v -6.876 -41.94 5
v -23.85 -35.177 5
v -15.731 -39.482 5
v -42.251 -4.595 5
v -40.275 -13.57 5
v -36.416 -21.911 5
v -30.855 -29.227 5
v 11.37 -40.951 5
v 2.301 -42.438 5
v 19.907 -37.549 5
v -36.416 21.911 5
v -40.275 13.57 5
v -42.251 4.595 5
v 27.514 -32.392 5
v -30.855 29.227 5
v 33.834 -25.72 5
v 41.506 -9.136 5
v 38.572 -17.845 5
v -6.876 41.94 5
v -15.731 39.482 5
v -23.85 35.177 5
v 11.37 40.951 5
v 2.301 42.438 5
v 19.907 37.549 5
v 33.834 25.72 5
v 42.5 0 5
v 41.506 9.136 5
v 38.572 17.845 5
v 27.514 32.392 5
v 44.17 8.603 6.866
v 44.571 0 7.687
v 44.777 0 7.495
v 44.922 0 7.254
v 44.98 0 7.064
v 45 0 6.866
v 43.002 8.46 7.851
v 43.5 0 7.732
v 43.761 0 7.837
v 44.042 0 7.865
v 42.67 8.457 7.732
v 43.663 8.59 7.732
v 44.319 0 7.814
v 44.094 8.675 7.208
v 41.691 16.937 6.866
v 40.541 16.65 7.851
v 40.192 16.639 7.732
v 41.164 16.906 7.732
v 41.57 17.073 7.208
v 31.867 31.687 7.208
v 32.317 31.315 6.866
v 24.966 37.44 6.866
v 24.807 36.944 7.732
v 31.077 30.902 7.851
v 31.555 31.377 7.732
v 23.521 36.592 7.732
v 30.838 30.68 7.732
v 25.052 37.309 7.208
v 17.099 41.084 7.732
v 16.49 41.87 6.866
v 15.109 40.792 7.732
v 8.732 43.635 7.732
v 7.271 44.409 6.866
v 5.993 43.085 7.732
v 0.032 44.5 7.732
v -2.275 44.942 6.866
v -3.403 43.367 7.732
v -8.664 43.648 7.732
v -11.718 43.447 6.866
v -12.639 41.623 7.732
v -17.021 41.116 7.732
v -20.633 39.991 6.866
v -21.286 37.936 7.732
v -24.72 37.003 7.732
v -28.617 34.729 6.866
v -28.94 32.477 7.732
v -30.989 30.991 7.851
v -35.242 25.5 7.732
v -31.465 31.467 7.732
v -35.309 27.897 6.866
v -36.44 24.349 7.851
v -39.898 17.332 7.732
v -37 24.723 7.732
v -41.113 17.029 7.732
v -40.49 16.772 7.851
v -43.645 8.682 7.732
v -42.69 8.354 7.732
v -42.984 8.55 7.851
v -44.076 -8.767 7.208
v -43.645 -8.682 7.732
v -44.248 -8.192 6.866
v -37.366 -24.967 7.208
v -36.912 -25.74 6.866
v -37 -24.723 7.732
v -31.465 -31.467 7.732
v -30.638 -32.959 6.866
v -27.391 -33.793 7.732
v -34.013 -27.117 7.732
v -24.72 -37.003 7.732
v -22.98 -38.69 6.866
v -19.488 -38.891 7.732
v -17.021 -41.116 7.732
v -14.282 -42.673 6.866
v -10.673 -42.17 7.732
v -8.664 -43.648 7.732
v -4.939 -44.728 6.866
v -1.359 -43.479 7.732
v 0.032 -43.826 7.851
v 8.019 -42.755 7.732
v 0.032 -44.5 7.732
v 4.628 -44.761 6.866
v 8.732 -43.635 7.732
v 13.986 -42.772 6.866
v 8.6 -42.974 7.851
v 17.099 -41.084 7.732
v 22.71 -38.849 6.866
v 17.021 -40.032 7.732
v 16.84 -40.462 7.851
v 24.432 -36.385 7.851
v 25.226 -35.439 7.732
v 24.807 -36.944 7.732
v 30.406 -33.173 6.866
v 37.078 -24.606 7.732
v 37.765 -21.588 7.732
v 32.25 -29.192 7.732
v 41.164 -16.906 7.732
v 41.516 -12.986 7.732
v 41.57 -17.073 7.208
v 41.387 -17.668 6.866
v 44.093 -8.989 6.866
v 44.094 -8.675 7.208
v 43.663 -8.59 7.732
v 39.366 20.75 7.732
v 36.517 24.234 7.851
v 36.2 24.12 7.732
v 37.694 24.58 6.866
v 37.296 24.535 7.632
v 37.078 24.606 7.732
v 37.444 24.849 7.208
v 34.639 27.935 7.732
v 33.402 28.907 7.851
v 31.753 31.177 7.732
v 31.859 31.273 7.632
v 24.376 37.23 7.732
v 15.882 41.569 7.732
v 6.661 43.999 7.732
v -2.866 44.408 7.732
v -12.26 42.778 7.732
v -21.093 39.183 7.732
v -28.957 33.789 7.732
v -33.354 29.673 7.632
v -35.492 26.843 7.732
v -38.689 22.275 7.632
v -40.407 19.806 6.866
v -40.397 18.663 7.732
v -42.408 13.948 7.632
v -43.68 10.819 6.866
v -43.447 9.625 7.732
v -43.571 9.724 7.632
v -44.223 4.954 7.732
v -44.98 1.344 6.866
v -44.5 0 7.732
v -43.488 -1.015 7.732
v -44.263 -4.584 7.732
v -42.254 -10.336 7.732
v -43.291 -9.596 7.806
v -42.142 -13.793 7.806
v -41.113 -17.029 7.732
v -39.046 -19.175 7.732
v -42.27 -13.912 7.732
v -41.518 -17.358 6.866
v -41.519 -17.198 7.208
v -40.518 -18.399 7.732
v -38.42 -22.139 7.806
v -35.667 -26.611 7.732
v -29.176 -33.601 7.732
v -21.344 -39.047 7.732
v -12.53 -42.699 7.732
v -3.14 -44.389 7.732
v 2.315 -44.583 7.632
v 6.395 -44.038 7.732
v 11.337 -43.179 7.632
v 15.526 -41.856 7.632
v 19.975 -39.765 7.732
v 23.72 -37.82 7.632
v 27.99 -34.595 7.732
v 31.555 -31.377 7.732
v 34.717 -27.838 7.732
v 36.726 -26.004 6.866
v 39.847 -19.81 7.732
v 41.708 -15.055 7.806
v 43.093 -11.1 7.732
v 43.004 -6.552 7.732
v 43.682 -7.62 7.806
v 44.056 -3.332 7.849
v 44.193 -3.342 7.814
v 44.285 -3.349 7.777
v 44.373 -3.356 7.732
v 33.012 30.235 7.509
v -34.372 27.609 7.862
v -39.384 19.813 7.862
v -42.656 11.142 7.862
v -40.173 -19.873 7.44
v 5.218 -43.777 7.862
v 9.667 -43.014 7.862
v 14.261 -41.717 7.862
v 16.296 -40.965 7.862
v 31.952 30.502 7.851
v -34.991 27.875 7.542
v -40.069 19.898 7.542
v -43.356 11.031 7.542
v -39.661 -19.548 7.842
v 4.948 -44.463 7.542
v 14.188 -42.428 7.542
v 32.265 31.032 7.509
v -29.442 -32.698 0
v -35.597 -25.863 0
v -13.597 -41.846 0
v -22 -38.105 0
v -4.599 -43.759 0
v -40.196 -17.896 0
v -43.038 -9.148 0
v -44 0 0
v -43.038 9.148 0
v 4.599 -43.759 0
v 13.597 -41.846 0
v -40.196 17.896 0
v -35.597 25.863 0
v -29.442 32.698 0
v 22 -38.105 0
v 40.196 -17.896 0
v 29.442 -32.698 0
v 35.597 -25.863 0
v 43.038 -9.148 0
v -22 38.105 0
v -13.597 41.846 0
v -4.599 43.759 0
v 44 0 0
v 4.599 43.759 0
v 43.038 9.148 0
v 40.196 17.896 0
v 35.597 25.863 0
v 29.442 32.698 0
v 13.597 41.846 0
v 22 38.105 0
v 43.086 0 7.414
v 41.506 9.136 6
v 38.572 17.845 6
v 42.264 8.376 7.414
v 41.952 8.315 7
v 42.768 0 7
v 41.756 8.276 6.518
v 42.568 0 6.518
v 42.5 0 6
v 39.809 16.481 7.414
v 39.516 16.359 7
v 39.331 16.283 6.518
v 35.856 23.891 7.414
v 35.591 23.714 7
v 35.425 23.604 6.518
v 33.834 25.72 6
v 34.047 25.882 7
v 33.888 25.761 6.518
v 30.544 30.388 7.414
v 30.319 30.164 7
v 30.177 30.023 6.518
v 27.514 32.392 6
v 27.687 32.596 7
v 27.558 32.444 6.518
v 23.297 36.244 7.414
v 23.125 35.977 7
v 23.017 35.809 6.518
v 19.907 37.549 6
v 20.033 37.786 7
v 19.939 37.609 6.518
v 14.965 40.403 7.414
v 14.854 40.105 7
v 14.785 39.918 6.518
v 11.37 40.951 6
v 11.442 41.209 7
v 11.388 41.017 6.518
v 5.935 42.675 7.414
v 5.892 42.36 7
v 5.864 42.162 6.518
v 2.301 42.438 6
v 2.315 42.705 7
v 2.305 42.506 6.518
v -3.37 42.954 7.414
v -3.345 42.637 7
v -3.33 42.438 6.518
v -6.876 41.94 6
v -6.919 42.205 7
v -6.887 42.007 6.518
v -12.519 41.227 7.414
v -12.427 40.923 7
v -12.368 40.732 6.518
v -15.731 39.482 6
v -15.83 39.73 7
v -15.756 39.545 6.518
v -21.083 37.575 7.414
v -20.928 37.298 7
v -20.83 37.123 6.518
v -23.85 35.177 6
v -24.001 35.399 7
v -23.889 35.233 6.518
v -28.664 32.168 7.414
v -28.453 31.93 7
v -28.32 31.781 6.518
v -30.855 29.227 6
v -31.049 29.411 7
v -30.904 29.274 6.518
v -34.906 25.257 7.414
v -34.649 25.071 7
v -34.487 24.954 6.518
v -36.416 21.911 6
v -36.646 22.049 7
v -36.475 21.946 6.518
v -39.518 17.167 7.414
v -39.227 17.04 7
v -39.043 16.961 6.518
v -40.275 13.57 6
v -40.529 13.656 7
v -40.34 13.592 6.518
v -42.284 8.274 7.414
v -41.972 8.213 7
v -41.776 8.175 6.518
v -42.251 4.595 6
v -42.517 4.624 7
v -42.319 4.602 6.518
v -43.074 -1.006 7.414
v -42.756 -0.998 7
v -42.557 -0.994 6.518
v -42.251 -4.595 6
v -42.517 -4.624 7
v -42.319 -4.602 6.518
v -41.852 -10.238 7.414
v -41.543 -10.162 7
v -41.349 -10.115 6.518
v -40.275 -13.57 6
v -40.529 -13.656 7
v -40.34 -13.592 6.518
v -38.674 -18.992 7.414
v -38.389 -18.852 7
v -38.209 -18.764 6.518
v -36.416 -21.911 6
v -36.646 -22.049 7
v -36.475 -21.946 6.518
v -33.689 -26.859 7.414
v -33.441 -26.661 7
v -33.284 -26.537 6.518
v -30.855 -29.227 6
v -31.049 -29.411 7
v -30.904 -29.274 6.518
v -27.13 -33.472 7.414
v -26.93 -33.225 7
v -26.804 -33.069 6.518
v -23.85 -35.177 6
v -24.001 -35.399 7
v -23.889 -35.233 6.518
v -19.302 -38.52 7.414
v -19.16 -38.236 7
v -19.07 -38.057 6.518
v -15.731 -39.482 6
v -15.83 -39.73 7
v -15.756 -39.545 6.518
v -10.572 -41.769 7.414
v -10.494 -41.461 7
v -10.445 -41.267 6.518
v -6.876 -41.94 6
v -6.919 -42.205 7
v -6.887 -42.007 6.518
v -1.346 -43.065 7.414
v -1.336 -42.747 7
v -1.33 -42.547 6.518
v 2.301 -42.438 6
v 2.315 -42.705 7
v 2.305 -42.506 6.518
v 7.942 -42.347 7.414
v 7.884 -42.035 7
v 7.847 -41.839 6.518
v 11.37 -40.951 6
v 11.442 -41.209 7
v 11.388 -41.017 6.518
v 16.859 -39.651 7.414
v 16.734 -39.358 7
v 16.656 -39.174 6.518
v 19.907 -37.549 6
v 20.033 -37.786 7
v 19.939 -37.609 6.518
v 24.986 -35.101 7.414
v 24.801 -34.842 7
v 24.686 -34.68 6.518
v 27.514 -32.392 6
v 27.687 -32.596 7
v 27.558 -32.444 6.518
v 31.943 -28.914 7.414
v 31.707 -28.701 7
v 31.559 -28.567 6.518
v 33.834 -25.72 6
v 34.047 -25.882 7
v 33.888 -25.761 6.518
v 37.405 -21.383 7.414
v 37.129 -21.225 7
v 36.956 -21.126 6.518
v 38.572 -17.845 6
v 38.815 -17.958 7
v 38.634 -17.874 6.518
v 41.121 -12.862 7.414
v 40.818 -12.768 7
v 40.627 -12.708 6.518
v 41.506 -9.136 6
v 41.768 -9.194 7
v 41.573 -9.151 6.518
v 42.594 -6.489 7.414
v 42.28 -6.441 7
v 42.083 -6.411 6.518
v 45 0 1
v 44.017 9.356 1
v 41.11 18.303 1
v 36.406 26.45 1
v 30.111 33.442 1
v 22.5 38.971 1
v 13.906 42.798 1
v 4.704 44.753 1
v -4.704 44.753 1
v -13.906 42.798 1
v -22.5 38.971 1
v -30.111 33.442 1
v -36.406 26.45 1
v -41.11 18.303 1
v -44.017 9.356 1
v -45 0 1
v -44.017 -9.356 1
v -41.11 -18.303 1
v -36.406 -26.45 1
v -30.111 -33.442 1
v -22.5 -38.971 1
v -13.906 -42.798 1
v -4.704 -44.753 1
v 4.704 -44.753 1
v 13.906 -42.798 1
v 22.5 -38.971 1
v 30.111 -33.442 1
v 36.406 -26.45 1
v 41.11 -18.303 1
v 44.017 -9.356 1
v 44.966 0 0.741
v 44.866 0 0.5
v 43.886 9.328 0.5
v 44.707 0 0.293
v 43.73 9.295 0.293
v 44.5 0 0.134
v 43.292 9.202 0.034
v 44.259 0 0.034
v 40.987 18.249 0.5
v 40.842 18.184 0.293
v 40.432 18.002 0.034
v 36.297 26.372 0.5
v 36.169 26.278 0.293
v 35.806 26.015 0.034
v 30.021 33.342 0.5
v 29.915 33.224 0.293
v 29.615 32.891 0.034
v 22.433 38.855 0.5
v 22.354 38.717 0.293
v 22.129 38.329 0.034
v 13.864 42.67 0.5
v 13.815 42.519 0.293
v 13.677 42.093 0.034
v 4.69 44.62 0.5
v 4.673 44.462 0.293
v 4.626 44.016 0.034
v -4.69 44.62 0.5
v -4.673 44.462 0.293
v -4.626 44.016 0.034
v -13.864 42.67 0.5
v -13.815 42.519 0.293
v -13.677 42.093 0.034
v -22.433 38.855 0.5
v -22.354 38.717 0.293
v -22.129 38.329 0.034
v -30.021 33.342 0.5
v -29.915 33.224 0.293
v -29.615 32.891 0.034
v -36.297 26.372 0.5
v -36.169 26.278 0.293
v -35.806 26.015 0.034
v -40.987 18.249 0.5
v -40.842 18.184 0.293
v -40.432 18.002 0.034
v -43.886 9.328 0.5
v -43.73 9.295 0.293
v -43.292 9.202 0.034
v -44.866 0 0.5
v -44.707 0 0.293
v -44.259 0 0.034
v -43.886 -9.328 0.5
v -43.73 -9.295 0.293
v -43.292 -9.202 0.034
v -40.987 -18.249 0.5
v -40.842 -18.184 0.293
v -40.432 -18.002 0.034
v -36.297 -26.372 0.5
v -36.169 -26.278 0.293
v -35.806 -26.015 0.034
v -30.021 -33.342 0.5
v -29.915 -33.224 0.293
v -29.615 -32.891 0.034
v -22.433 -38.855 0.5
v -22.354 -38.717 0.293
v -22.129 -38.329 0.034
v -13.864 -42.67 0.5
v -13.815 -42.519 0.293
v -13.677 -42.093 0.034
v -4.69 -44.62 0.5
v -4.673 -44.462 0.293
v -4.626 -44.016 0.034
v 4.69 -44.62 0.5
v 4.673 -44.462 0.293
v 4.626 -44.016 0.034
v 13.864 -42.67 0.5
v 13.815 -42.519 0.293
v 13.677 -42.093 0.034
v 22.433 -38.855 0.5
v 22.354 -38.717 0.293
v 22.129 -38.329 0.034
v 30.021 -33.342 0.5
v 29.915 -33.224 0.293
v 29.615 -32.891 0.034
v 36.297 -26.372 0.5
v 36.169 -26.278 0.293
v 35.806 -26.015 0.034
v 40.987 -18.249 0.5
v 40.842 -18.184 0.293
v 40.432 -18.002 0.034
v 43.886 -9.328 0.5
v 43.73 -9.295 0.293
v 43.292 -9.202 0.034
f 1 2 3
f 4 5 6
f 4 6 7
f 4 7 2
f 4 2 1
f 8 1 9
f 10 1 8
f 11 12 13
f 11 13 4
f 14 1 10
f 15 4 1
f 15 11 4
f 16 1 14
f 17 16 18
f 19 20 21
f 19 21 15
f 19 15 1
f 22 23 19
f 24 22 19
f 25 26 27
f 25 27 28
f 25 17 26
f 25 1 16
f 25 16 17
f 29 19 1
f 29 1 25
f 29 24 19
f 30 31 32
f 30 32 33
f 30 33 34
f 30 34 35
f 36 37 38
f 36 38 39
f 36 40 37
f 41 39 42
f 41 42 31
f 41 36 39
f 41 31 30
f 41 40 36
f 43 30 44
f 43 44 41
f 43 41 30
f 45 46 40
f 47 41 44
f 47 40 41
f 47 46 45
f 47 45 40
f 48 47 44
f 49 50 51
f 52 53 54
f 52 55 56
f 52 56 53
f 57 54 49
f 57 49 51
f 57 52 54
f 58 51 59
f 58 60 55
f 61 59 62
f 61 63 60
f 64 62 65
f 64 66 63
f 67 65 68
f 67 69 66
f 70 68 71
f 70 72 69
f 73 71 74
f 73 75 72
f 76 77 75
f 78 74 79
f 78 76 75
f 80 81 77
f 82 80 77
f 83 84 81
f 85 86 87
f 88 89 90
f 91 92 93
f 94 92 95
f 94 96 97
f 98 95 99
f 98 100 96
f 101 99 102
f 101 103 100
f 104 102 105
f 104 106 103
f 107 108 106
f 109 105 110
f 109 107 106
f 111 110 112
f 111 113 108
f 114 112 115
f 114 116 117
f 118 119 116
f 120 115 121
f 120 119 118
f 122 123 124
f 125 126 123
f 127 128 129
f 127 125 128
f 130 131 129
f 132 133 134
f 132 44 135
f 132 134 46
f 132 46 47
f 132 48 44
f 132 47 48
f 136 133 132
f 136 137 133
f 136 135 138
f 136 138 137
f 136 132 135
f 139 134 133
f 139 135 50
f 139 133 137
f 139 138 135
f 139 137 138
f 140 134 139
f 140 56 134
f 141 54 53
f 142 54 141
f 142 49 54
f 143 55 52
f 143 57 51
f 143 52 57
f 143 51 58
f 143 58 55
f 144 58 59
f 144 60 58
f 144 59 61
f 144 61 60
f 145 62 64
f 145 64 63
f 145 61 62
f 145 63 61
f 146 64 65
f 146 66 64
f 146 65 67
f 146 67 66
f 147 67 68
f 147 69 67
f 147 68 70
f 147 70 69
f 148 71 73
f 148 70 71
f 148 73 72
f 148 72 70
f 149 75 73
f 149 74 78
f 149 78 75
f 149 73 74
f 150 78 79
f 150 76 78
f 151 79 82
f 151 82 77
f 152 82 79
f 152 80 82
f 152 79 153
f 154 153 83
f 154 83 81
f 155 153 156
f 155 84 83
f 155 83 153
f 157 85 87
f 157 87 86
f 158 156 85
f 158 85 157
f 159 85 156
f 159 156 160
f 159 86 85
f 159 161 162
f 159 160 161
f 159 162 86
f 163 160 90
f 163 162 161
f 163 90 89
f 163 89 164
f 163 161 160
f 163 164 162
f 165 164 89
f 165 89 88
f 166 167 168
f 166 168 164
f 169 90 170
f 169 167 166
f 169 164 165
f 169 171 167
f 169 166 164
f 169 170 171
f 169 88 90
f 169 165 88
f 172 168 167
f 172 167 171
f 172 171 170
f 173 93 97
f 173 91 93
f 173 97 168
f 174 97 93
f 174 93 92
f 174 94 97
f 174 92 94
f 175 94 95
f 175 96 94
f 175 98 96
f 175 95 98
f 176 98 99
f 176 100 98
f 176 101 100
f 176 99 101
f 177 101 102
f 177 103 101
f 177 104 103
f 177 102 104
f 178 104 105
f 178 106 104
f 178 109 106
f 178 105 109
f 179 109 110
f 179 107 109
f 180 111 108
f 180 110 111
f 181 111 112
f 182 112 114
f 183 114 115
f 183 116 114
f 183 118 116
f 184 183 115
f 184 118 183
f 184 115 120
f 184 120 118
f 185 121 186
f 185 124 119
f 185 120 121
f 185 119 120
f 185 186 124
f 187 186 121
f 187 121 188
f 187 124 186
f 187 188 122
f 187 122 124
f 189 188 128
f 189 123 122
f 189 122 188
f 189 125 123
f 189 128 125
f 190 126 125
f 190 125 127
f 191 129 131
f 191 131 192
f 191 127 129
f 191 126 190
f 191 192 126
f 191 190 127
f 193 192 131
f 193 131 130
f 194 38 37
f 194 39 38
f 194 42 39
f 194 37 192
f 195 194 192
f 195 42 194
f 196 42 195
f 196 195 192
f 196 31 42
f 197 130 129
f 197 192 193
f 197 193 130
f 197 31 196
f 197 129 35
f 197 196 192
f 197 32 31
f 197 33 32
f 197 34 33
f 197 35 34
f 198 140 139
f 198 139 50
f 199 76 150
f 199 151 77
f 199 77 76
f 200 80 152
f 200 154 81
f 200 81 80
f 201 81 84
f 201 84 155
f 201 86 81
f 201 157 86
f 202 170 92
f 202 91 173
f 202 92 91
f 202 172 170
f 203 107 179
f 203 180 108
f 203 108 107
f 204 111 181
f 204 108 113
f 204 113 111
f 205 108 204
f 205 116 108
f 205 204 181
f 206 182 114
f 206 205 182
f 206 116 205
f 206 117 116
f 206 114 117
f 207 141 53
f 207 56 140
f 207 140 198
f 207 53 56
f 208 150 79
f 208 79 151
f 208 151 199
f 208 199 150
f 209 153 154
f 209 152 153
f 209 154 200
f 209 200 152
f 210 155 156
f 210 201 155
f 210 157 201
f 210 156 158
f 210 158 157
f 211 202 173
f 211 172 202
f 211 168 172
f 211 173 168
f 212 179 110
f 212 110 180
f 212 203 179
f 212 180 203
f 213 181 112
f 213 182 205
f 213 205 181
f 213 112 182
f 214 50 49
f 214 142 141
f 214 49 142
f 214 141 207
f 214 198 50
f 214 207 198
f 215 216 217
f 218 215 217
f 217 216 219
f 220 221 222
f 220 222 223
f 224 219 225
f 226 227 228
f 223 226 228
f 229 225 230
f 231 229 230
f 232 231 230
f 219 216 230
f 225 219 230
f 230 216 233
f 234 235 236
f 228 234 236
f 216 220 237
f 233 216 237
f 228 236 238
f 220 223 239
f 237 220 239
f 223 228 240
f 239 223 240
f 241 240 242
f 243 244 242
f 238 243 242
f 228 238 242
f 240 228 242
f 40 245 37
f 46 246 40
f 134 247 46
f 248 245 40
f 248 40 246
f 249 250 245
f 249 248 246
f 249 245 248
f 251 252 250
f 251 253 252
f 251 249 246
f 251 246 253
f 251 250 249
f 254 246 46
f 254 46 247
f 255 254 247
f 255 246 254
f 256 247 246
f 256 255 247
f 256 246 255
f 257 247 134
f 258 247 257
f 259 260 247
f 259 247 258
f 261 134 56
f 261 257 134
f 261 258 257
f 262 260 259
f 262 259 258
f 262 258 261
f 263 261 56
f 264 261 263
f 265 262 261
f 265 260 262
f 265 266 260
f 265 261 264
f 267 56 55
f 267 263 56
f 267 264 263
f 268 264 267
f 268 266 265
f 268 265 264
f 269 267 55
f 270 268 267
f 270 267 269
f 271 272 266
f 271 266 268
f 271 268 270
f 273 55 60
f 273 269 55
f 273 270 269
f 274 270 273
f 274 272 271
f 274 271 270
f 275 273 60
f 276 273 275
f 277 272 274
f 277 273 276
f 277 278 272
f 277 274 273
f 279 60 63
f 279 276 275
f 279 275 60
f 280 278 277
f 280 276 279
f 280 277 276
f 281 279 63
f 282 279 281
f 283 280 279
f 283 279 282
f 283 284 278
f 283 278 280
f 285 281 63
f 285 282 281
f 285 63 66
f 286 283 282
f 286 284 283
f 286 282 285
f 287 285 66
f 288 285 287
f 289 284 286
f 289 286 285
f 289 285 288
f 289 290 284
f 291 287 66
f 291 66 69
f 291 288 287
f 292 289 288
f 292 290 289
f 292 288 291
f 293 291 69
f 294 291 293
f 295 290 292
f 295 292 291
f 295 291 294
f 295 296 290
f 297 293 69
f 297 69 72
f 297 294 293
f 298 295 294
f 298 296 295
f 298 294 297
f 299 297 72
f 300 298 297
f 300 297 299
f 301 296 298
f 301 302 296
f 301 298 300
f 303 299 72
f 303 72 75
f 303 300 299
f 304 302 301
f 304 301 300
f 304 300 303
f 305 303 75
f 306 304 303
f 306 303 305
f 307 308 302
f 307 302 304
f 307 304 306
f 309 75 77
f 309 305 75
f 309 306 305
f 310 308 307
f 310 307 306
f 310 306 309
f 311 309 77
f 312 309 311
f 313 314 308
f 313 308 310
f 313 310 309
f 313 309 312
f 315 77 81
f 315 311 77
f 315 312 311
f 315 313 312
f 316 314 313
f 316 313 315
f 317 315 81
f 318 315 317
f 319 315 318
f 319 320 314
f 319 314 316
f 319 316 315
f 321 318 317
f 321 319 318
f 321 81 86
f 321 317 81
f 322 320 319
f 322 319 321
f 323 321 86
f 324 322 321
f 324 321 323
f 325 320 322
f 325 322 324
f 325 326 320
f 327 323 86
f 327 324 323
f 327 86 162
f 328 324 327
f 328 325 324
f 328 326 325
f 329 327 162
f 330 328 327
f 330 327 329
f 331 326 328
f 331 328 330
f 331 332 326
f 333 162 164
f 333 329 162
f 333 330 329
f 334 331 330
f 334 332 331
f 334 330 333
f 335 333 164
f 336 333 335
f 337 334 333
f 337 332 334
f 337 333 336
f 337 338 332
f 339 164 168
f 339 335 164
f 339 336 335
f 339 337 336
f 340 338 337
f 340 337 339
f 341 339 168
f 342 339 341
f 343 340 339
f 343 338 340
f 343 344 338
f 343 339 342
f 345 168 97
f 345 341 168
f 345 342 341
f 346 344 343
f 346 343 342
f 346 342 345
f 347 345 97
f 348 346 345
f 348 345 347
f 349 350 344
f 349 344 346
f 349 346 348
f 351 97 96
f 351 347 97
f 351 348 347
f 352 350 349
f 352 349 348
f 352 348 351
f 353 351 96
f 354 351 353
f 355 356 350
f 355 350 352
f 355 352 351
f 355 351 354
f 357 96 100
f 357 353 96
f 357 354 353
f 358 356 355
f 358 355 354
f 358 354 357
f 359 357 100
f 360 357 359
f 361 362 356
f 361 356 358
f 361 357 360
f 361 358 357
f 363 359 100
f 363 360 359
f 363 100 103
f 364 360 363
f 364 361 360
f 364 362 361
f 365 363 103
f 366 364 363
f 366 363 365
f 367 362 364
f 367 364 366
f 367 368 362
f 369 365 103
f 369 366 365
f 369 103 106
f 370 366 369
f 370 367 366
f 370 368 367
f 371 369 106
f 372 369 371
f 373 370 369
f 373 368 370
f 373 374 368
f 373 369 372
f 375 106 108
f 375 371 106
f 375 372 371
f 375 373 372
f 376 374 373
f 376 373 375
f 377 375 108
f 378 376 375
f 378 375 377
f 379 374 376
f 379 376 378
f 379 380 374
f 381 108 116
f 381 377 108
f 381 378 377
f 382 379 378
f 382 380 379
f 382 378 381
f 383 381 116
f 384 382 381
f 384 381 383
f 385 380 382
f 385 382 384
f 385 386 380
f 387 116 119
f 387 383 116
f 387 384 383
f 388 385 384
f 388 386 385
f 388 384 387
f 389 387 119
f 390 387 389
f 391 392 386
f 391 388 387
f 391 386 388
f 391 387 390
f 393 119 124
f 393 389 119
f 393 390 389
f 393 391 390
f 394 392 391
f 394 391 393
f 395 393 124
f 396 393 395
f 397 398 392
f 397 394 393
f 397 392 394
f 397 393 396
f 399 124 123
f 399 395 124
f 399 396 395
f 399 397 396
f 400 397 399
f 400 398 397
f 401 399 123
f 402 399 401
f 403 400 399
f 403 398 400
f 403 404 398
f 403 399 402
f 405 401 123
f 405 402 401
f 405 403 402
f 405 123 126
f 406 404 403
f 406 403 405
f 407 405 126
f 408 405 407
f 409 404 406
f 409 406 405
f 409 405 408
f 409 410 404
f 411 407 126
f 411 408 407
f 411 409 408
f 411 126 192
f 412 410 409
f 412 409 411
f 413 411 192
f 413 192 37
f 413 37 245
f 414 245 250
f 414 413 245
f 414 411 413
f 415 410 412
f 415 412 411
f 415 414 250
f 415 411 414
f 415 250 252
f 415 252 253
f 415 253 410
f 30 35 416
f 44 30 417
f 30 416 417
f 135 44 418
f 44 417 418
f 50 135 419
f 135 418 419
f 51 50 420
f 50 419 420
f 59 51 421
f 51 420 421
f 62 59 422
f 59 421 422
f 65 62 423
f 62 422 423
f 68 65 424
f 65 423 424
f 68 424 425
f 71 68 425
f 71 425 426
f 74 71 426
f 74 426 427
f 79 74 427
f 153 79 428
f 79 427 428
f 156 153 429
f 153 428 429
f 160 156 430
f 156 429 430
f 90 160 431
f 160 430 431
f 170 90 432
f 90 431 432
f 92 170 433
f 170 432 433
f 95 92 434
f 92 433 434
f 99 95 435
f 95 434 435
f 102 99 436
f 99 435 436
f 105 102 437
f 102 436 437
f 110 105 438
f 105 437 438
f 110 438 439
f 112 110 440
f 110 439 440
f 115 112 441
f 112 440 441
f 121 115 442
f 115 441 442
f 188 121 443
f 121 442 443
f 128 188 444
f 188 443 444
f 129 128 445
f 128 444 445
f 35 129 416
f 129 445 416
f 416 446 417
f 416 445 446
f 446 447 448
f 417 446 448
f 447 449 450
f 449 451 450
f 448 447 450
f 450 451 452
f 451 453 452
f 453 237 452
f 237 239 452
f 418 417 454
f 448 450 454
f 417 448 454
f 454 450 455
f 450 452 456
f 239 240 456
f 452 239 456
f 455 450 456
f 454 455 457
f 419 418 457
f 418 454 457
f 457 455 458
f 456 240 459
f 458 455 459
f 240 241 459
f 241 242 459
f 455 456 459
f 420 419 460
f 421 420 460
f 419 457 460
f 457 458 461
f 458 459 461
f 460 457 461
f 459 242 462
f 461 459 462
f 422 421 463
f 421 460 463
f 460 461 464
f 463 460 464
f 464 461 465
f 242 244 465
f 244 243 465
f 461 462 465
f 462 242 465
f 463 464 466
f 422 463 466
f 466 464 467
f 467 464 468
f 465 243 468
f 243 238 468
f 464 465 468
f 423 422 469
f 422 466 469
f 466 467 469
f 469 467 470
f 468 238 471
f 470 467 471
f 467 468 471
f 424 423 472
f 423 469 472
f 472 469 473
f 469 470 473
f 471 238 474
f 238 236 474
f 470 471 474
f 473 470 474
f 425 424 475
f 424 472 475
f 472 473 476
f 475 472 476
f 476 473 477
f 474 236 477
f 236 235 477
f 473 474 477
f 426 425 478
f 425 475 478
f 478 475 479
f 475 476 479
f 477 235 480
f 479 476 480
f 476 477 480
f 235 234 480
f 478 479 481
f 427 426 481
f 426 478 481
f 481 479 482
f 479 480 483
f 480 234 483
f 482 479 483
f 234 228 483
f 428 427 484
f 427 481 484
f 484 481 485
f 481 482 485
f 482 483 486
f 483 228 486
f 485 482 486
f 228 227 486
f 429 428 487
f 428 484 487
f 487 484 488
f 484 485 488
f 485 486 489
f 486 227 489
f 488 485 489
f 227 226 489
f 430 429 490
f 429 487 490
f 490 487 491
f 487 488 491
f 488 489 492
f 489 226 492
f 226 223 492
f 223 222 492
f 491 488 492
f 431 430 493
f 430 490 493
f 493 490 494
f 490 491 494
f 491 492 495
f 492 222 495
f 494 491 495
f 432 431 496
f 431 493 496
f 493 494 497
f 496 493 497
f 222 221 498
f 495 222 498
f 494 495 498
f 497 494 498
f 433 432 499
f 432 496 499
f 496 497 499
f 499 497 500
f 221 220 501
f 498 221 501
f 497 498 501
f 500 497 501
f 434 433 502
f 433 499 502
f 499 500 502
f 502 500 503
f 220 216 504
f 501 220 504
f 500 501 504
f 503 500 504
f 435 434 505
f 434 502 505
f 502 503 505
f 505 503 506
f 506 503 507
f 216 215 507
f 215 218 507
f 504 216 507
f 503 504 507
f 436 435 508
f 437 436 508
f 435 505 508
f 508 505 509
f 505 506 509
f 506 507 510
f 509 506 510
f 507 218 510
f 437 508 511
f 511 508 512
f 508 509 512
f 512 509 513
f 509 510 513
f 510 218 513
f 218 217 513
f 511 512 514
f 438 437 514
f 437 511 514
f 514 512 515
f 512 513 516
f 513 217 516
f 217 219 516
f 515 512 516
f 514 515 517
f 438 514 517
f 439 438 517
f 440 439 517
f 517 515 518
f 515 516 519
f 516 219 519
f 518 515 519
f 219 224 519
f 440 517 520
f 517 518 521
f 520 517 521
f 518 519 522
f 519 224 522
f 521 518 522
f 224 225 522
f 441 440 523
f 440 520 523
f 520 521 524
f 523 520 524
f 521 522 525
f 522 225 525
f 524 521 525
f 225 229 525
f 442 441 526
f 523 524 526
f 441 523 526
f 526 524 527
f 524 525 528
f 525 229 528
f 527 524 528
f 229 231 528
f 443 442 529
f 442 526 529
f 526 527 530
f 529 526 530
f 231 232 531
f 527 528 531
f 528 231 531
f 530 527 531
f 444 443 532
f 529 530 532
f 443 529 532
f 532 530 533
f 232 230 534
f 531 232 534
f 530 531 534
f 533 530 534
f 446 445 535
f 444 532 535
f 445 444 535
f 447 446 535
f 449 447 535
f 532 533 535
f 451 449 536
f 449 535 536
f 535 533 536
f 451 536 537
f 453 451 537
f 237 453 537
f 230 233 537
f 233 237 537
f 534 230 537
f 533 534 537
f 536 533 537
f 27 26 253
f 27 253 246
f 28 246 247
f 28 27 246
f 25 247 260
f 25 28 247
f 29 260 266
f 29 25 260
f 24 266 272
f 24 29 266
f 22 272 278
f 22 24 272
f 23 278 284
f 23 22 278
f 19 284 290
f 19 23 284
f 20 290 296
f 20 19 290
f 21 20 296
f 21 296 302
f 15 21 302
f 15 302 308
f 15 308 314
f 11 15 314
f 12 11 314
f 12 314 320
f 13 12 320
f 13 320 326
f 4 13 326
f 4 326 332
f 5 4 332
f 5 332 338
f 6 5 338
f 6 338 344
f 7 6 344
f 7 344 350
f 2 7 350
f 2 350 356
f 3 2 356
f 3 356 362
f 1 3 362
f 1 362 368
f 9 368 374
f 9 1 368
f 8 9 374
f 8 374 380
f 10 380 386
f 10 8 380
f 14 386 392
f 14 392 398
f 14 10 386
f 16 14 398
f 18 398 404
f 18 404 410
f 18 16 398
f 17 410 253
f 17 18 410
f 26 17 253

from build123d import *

# Parameters (mm, degrees)
F0_R     = 42.5
F1_DEPTH = 5
F0_R_2   = 45
F2_DEPTH = 8
F3_R     = 2
F4_R     = 1


with BuildPart() as f1:
    # F0 (on Top) → F1 (new body)
    with BuildSketch(Plane.XY):
        Circle(F0_R)
    extrude(amount=F1_DEPTH)

    # F0 (on Top) → F2 (join)
    with BuildSketch(Plane.XY):
        Circle(F0_R_2)
        Circle(F0_R, mode=Mode.SUBTRACT)
    extrude(amount=F2_DEPTH)

    # F3
    f3_edges = [f1.edges().sort_by_distance(p)[0] for p in [
        (-42.5, 0, 8),
    ]]
    fillet(f3_edges, radius=F3_R)

    # F4
    f4_edges = [f1.edges().sort_by_distance(p)[0] for p in [
        (45, 0, 4),
        (-45, 0, 0),
        (-45, 0, 8),
    ]]
    fillet(f4_edges, radius=F4_R)


solid = f1.part
